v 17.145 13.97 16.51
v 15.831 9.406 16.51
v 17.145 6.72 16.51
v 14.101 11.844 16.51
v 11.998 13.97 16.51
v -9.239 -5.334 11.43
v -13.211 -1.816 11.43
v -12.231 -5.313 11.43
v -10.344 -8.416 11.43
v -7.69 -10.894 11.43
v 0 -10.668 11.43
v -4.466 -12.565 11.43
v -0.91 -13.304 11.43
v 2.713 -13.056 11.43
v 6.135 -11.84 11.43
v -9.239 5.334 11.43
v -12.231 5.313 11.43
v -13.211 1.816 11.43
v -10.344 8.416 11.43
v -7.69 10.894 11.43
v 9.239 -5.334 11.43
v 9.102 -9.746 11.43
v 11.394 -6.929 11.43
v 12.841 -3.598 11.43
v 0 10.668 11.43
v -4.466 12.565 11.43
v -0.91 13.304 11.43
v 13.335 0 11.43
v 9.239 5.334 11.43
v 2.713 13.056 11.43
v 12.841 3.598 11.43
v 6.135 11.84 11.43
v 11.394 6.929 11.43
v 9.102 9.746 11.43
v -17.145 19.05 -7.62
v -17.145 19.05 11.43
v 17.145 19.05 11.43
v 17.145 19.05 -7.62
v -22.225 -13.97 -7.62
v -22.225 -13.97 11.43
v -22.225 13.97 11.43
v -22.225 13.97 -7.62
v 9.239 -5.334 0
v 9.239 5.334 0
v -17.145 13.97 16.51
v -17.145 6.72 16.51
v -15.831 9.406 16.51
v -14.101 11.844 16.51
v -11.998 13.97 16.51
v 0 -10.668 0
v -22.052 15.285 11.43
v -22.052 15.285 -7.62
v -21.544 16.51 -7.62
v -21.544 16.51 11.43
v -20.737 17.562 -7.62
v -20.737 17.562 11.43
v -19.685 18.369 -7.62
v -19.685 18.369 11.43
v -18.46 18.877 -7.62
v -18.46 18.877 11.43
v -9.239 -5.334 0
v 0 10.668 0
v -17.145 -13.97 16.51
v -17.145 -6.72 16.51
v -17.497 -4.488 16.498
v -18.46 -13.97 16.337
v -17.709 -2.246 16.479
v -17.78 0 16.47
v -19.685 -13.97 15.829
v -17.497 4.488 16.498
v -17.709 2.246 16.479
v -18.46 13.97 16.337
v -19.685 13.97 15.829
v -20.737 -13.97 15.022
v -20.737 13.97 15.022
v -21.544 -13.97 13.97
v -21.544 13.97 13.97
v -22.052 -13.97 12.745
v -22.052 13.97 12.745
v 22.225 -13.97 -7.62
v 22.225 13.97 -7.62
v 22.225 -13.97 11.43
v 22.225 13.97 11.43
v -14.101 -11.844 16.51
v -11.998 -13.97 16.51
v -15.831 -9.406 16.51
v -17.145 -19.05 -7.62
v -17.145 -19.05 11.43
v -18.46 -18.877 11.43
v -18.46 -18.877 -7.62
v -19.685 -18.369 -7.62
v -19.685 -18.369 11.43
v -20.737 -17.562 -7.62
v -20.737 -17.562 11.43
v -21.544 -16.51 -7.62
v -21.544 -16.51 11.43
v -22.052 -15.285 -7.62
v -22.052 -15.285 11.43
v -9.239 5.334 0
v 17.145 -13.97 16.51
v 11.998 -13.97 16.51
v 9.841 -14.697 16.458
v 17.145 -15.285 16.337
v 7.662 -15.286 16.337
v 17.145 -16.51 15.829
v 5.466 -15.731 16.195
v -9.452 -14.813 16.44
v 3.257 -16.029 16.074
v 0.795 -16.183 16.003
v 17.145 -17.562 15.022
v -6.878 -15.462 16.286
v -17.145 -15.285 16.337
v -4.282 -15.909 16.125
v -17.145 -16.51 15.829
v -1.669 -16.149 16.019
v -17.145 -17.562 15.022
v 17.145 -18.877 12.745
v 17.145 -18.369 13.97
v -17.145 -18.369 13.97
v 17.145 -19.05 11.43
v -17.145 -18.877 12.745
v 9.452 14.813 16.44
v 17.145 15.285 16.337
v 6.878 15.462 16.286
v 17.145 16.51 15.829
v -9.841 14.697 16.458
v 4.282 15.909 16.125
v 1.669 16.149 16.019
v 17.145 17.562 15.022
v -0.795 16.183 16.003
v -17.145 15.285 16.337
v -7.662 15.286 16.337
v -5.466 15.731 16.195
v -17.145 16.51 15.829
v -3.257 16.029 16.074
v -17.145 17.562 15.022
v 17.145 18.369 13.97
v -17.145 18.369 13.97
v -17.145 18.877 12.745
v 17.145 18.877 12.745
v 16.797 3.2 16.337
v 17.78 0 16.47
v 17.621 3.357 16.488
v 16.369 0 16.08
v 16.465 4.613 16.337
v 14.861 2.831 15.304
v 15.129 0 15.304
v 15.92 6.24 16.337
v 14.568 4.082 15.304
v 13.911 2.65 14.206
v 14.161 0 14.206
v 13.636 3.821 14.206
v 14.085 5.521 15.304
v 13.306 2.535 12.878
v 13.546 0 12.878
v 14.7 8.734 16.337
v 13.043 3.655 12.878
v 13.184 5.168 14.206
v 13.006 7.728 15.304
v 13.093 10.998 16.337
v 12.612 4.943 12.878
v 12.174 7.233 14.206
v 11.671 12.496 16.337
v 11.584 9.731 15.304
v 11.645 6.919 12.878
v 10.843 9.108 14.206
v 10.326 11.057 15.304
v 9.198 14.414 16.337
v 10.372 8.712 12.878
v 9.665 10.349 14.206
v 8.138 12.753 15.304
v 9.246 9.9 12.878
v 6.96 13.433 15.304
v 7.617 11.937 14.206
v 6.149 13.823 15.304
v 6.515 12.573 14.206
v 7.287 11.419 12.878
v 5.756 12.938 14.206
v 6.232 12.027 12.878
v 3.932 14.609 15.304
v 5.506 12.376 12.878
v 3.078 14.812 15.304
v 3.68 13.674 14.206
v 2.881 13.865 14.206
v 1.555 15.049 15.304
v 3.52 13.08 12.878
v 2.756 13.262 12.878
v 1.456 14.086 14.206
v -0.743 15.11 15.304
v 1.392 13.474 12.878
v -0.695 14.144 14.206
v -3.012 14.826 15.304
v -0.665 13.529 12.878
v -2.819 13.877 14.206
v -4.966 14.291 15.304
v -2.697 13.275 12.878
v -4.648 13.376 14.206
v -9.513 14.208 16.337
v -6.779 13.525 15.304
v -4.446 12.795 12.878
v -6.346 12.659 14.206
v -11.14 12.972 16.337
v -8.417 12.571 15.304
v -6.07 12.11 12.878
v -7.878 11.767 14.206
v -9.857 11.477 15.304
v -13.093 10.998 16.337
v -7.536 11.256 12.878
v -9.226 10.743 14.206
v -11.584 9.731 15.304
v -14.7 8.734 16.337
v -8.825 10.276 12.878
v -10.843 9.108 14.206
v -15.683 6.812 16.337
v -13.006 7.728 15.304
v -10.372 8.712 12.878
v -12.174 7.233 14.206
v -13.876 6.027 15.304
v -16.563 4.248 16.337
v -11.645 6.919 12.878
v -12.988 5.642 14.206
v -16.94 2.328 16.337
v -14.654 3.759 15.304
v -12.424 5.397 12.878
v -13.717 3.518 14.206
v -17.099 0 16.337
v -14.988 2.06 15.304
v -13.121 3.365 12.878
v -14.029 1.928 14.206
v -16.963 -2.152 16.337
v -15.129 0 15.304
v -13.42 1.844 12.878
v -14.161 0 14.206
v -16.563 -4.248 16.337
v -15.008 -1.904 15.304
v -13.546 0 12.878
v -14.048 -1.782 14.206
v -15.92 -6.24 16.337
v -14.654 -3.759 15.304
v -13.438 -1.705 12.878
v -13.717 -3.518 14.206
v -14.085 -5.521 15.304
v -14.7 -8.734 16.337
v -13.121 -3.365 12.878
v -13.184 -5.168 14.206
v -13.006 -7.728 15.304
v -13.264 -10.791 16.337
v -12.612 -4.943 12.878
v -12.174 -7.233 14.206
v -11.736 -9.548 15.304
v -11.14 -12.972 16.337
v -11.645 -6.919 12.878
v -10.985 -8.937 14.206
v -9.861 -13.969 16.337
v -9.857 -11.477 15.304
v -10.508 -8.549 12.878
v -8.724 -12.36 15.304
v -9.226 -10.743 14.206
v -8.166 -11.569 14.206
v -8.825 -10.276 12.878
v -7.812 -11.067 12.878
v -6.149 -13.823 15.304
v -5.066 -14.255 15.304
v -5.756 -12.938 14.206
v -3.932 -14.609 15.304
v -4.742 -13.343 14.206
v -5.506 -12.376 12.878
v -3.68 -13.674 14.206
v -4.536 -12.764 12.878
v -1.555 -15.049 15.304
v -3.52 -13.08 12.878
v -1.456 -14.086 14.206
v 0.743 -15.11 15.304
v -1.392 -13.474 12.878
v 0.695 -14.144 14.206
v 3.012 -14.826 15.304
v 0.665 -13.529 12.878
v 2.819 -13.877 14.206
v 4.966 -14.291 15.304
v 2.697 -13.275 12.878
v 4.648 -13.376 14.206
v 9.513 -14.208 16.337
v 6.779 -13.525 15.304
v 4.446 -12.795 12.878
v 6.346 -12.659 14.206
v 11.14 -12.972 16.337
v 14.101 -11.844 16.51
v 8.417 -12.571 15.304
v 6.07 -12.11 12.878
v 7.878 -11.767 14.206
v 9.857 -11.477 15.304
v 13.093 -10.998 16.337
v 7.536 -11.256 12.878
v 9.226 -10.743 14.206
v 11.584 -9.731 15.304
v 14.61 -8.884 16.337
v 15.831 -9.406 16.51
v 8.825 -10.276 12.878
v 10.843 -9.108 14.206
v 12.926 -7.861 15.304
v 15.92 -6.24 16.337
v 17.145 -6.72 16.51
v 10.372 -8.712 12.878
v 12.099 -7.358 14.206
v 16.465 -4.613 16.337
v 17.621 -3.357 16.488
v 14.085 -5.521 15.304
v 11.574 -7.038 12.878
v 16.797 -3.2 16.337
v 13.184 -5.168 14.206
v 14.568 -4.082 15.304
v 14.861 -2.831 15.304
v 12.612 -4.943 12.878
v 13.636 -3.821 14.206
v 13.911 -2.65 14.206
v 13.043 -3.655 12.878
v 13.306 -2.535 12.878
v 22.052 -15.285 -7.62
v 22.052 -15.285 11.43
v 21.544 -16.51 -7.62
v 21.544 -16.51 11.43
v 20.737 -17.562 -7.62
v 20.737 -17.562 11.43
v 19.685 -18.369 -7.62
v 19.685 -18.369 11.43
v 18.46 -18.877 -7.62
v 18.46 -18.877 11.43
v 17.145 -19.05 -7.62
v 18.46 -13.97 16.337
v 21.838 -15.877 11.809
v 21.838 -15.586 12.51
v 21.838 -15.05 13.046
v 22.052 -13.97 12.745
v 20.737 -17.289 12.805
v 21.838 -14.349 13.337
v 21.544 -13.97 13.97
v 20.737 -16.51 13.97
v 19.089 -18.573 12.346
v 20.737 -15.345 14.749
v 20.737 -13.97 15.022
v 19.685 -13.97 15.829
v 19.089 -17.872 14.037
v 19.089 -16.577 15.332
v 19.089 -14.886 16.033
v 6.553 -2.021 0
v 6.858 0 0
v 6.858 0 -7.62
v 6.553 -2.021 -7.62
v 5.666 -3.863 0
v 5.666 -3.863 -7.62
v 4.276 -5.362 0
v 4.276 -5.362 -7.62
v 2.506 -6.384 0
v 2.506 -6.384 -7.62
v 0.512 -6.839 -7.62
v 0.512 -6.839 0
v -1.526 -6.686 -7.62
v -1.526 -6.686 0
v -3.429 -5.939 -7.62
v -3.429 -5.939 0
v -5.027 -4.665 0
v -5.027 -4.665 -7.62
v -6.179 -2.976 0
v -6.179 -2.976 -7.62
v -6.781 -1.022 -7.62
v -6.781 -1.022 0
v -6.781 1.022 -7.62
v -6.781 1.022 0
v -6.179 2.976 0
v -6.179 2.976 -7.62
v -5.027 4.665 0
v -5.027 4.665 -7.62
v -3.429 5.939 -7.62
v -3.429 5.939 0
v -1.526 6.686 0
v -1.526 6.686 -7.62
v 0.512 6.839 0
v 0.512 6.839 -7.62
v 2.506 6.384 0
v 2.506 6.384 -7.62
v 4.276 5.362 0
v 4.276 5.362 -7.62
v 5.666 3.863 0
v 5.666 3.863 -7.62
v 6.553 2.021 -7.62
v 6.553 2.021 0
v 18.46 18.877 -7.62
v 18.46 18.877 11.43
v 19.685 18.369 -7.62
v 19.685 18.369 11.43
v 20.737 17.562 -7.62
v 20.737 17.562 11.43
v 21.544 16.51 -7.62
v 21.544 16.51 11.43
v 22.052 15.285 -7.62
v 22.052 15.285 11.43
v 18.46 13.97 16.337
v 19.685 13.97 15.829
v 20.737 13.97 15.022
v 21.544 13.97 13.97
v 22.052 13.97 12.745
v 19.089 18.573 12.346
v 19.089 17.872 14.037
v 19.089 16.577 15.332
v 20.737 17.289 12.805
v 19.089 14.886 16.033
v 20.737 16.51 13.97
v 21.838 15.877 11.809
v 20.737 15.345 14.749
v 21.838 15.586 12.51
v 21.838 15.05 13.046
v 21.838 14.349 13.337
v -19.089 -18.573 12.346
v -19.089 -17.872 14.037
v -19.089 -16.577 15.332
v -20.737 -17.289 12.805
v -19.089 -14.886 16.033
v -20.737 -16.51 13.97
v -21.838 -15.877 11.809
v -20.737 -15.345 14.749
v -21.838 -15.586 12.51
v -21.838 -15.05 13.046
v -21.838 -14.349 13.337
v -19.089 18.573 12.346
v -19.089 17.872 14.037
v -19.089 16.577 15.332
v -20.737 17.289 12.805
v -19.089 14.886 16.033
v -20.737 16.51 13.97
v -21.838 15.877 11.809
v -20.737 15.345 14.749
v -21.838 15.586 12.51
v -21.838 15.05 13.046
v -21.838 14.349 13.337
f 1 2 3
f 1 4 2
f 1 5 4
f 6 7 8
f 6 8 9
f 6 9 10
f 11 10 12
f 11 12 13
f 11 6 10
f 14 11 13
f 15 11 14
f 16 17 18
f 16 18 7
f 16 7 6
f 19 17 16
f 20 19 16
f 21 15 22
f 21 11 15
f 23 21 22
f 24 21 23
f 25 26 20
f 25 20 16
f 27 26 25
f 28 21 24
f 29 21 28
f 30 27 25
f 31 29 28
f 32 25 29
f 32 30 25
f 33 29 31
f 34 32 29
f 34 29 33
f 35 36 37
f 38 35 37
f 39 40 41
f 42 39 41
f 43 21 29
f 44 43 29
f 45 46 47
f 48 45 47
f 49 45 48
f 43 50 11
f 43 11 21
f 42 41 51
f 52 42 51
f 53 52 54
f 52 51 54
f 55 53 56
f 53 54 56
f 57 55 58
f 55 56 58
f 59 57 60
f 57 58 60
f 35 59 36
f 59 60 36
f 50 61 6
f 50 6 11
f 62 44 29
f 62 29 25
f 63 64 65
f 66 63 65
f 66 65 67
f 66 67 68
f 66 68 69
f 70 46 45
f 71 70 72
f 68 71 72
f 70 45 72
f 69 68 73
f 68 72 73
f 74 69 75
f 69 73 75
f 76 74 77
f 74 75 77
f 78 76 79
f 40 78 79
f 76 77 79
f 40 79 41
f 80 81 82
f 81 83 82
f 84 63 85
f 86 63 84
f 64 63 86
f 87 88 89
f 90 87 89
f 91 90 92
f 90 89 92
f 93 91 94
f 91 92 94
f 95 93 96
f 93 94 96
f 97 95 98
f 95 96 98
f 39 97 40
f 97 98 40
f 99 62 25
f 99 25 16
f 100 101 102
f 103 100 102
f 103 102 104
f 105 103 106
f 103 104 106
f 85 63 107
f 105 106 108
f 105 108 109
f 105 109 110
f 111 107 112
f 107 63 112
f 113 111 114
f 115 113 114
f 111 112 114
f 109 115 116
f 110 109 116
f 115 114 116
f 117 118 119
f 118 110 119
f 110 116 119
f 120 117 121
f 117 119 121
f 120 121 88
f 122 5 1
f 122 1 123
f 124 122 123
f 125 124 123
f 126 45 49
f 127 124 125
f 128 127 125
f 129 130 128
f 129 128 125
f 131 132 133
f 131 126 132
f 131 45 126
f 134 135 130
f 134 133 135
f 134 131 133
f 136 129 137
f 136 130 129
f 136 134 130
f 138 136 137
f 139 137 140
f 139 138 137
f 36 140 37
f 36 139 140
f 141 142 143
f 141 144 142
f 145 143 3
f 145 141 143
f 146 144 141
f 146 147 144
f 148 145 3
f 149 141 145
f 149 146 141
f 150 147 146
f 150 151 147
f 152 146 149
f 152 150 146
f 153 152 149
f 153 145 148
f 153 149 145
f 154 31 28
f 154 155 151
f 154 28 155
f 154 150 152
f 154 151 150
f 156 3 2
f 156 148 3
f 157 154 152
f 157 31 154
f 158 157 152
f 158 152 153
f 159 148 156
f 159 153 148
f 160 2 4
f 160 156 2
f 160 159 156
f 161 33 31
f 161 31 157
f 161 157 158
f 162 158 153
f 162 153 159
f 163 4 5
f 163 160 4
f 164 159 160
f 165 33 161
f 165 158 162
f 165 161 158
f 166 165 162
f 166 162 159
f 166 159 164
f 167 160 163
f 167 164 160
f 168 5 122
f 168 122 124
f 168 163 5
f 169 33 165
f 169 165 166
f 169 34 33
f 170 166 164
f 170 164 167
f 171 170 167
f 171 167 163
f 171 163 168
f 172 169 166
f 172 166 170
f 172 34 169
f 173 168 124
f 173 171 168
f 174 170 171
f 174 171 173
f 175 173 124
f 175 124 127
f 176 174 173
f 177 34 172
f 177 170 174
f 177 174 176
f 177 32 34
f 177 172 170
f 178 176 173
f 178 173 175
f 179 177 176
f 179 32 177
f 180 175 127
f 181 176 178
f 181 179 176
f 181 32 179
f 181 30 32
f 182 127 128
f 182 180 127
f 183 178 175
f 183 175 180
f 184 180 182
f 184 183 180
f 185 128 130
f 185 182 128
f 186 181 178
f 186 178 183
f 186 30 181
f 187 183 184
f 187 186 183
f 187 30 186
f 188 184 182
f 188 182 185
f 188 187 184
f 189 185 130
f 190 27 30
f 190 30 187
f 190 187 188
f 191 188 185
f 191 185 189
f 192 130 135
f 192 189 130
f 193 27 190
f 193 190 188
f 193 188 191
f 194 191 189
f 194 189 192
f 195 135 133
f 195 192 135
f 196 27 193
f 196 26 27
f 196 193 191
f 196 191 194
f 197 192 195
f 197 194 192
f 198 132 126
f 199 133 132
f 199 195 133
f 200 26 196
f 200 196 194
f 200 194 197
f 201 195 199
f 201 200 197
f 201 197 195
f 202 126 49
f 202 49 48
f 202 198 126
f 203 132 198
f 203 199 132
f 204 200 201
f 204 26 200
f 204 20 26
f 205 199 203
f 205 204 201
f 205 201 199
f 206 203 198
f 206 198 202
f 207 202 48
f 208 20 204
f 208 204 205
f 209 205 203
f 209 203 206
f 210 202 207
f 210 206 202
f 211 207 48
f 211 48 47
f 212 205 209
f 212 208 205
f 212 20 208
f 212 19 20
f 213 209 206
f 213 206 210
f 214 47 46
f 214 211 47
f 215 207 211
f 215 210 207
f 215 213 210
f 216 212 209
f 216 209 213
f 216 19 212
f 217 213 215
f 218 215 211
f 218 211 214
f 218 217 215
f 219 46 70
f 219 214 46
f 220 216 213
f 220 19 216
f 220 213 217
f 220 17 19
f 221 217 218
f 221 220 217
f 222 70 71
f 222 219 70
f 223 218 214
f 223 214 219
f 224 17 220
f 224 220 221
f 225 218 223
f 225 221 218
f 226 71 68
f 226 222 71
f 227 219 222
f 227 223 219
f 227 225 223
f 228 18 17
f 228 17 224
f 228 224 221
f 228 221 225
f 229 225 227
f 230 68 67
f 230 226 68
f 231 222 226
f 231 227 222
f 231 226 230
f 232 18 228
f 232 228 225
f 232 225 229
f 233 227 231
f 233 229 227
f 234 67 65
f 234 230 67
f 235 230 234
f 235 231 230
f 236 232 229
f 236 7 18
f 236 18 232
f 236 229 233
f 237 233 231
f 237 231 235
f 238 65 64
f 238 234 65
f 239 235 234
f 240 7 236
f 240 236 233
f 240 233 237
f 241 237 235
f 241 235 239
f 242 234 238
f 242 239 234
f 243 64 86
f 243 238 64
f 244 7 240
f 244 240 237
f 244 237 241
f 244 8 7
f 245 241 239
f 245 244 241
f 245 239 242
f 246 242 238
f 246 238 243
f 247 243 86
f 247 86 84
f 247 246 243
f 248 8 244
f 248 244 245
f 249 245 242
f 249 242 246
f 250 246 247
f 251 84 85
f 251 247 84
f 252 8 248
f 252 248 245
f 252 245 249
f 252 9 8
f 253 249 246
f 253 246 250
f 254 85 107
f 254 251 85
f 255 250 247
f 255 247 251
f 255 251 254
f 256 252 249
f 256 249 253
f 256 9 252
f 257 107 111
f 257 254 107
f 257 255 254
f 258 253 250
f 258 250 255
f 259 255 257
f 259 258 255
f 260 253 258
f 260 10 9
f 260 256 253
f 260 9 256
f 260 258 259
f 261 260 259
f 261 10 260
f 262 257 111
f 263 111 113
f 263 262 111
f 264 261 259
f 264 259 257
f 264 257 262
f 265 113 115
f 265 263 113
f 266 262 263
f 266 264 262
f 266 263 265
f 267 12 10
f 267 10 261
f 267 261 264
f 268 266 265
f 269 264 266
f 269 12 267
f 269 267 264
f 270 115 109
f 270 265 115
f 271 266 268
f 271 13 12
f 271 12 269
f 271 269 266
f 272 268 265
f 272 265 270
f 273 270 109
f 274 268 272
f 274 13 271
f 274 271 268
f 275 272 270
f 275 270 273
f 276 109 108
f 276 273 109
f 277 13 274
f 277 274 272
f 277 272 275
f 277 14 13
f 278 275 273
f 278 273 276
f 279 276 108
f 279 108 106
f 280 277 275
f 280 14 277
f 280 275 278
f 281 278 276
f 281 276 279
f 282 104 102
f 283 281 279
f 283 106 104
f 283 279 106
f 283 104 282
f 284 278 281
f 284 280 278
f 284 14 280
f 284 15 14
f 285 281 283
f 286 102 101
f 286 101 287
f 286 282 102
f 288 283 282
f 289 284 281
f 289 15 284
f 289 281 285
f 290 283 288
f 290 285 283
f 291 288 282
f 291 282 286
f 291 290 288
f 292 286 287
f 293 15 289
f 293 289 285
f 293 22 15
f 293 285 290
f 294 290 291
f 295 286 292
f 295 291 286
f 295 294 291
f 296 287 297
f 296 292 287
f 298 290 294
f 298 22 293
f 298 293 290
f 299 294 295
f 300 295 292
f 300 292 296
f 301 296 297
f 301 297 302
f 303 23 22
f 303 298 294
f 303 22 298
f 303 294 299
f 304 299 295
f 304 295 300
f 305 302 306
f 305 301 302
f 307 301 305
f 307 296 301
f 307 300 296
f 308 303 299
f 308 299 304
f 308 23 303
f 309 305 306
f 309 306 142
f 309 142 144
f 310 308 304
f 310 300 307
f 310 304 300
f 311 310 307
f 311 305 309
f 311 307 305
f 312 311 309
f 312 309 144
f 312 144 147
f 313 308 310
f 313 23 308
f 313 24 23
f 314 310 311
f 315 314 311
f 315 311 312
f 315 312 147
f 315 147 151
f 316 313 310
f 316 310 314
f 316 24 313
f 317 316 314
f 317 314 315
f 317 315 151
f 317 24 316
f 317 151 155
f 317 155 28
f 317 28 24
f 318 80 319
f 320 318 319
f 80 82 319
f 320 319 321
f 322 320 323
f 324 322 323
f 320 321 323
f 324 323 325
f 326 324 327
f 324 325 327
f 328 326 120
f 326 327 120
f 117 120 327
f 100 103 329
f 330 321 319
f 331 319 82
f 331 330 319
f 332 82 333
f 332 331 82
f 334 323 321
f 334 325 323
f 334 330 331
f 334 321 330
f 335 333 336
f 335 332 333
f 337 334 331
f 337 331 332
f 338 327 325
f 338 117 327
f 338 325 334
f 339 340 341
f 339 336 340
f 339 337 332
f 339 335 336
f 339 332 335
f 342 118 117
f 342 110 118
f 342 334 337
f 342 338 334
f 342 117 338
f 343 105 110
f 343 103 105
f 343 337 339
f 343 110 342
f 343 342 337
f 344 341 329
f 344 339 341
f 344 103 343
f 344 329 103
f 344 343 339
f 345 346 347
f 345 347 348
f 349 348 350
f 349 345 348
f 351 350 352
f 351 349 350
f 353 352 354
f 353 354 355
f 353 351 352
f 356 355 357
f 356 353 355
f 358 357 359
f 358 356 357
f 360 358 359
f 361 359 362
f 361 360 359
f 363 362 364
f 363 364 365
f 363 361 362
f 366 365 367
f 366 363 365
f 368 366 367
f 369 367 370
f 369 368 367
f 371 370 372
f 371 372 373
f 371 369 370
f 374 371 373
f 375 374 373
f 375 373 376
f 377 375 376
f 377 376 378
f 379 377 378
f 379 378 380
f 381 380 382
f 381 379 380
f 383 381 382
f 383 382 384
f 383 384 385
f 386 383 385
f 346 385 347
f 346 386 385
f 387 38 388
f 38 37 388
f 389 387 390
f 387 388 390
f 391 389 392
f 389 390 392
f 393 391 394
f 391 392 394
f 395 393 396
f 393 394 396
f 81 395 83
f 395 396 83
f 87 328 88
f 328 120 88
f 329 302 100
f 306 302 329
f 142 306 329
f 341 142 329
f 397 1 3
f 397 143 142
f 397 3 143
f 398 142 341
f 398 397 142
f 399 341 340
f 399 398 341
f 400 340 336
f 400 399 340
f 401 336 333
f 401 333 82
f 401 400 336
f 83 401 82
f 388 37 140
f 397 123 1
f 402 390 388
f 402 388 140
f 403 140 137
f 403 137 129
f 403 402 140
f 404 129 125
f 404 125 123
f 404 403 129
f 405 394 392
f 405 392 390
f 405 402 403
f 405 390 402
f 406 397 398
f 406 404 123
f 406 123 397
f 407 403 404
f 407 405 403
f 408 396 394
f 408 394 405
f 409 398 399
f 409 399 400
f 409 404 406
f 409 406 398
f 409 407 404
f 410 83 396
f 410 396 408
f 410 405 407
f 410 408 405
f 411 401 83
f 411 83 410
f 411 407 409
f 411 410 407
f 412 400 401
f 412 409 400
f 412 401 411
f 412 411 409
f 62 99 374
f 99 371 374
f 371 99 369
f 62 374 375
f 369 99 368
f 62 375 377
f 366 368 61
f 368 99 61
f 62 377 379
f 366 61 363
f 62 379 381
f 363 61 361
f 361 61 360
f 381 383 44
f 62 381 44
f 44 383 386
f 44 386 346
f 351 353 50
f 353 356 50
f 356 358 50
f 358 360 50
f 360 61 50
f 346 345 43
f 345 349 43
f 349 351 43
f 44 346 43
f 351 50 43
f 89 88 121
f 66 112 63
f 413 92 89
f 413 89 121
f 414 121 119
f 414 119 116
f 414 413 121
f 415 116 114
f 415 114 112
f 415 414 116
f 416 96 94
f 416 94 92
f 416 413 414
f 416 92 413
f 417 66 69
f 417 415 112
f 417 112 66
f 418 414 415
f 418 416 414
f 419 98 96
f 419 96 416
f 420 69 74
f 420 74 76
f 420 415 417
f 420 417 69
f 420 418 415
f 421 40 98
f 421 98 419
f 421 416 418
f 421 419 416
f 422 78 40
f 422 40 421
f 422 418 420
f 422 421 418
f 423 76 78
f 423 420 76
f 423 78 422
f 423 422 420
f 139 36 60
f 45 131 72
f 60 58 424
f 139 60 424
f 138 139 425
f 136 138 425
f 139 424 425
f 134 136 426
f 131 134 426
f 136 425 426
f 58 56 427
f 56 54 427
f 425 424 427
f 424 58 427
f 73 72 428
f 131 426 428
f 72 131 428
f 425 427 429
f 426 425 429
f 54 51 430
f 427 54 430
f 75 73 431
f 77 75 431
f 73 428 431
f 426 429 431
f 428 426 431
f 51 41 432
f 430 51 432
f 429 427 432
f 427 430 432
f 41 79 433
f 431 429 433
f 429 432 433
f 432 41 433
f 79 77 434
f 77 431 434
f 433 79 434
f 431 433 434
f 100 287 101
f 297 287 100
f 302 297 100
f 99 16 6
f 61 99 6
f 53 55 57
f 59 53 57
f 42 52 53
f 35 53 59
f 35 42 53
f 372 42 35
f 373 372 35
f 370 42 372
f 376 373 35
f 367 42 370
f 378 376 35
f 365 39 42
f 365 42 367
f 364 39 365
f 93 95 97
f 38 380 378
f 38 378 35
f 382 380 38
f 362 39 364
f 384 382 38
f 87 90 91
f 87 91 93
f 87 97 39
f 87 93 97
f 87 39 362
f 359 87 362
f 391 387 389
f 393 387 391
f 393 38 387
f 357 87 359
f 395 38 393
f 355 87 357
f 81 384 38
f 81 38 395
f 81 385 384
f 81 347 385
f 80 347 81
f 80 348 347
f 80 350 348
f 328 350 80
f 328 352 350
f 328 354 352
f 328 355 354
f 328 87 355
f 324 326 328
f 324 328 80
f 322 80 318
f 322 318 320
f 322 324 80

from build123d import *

# Parameters (mm, degrees)
F0_W         = 44.45
F0_H         = 38.1
F1_DEPTH     = 16.51
F3_DEPTH     = 25.4
F4_R         = 13.335
F5_DEPTH     = 5.08
F6_F1_R      = 5.0799
F6_T2_DEPTH  = 69.85
F6_T4_DEPTH  = 69.85
F6_T6_DEPTH  = 27.94
F6_T8_DEPTH  = 24.13
F6_T11_ANGLE = 90
F6_T13_ANGLE = 90
F6_T14_DEPTH = 27.94
F6_T16_DEPTH = 24.13
F6_T19_ANGLE = 90
F6_T21_ANGLE = 90
F8_R         = 6.858
F9_DEPTH     = 7.62


# Not quite as in the source:
# - a fillet or chamfer that OpenCascade refuses, or shapes differently, is made with other operations: its cross-section is extruded or revolved along the edge and cut away or added
# - a fillet or chamfer is up to 0.001 mm smaller than in the source, because OpenCascade refuses the exact size
# - a feature of the source that left no trace in its solid (it failed there, or was rolled back) is left out


with BuildPart() as f1:
    # F0 (on Top) → F1 (new body)
    with BuildSketch(Plane.XY):
        Rectangle(F0_W, F0_H)
    extrude(amount=F1_DEPTH)

    # F2 (on face) → F3 (cut)
    with BuildSketch(Plane.XY.offset(16.51)):
        Polygon((9.2387590076, 5.334), (0, 10.668), (-9.2387590076, 5.334), (-9.2387590076, -5.334), (0, -10.668), (9.2387590076, -5.334), align=None)
    extrude(amount=-F3_DEPTH, mode=Mode.SUBTRACT)

    # F4 (on face) → F5 (cut)
    with BuildSketch(Plane.XY.offset(16.51)):
        Circle(F4_R)
        Polygon((-9.2387590076, 5.334), (0, 10.668), (9.2387590076, 5.334), (9.2387590076, -5.334), (0, -10.668), (-9.2387590076, -5.334), align=None, mode=Mode.SUBTRACT)
    extrude(amount=-F5_DEPTH, mode=Mode.SUBTRACT)

    # F6: fillet of radius 5.08 on 5 edges, made by hand

    # F6_f1 (radius 5.08 in the source; OpenCascade refuses exactly that, so slightly less here)
    f6_f1_edges = [f1.edges().sort_by_distance(p)[0] for p in [
        (-13.335, 0, 16.51),
    ]]
    fillet(f6_f1_edges, radius=F6_F1_R)

    # F6_s3 → F6_t2 (cut)
    with BuildSketch(Plane.YZ.offset(-34.925)):
        with BuildLine():
            ThreePointArc((13.97, 16.51), (17.5621024484, 15.0221024484), (19.05, 11.43))
            Line((19.05, 11.43), (19.1516, 11.43))
            Line((19.1516, 11.43), (19.1516, 16.6116))
            Line((19.1516, 16.6116), (13.97, 16.6116))
            Line((13.97, 16.6116), (13.97, 16.51))
        make_face()
    extrude(amount=F6_T2_DEPTH, mode=Mode.SUBTRACT)

    # F6_s5 → F6_t4 (cut)
    with BuildSketch(Plane.YZ.offset(-34.925)):
        with BuildLine():
            ThreePointArc((-13.97, 16.51), (-17.5621024484, 15.0221024484), (-19.05, 11.43))
            Line((-19.05, 11.43), (-19.1516, 11.43))
            Line((-19.1516, 11.43), (-19.1516, 16.6116))
            Line((-19.1516, 16.6116), (-13.97, 16.6116))
            Line((-13.97, 16.6116), (-13.97, 16.51))
        make_face()
    extrude(amount=F6_T4_DEPTH, mode=Mode.SUBTRACT)

    # F6_s7 → F6_t6 (cut)
    with BuildSketch(Plane.XZ.offset(-13.97)):
        with BuildLine():
            ThreePointArc((17.145, 16.51), (20.7371024484, 15.0221024484), (22.225, 11.43))
            Line((22.225, 11.43), (22.3266, 11.43))
            Line((22.3266, 11.43), (22.3266, 16.6116))
            Line((22.3266, 16.6116), (17.145, 16.6116))
            Line((17.145, 16.6116), (17.145, 16.51))
        make_face()
    extrude(amount=F6_T6_DEPTH, mode=Mode.SUBTRACT)

    # F6_s9 → F6_t8 (cut)
    with BuildSketch(Plane.XY.offset(-12.7)):
        with BuildLine():
            ThreePointArc((22.225, 13.97), (20.7371024484, 17.5621024484), (17.145, 19.05))
            Line((17.145, 19.05), (17.145, 19.1516))
            Line((17.145, 19.1516), (22.3266, 19.1516))
            Line((22.3266, 19.1516), (22.3266, 13.97))
            Line((22.3266, 13.97), (22.225, 13.97))
        make_face()
        with BuildLine():
            ThreePointArc((22.225, -13.97), (20.7371024484, -17.5621024484), (17.145, -19.05))
            Line((17.145, -19.05), (17.145, -19.1516))
            Line((17.145, -19.1516), (22.3266, -19.1516))
            Line((22.3266, -19.1516), (22.3266, -13.97))
            Line((22.3266, -13.97), (22.225, -13.97))
        make_face()
    extrude(amount=F6_T8_DEPTH, mode=Mode.SUBTRACT)

    # F6_s10 → F6_t11 (revolve, cut)
    with BuildSketch(Plane.XY.offset(11.43)):
        with BuildLine():
            ThreePointArc((22.225, -13.97), (20.7371024484, -17.5621024484), (17.145, -19.05))
            Line((17.145, -19.05), (17.145, -19.1516))
            Line((17.145, -19.1516), (22.3266, -19.1516))
            Line((22.3266, -19.1516), (22.3266, -13.97))
            Line((22.3266, -13.97), (22.225, -13.97))
        make_face()
    revolve(axis=Axis((22.225, -13.97, 11.43), (-1, 0, 0)), revolution_arc=F6_T11_ANGLE, mode=Mode.SUBTRACT)

    # F6_s12 → F6_t13 (revolve, cut)
    with BuildSketch(Plane.XY.offset(11.43)):
        with BuildLine():
            ThreePointArc((17.145, 19.05), (20.7371024484, 17.5621024484), (22.225, 13.97))
            Line((22.225, 13.97), (22.3266, 13.97))
            Line((22.3266, 13.97), (22.3266, 19.1516))
            Line((22.3266, 19.1516), (17.145, 19.1516))
            Line((17.145, 19.1516), (17.145, 19.05))
        make_face()
    revolve(axis=Axis((22.225, 13.97, 11.43), (1, 0, 0)), revolution_arc=F6_T13_ANGLE, mode=Mode.SUBTRACT)

    # F6_s15 → F6_t14 (cut)
    with BuildSketch(Plane.XZ.offset(-13.97)):
        with BuildLine():
            ThreePointArc((-17.145, 16.51), (-20.7371024484, 15.0221024484), (-22.225, 11.43))
            Line((-22.225, 11.43), (-22.3266, 11.43))
            Line((-22.3266, 11.43), (-22.3266, 16.6116))
            Line((-22.3266, 16.6116), (-17.145, 16.6116))
            Line((-17.145, 16.6116), (-17.145, 16.51))
        make_face()
    extrude(amount=F6_T14_DEPTH, mode=Mode.SUBTRACT)

    # F6_s17 → F6_t16 (cut)
    with BuildSketch(Plane.XY.offset(-12.7)):
        with BuildLine():
            ThreePointArc((-22.225, -13.97), (-20.7371024484, -17.5621024484), (-17.145, -19.05))
            Line((-17.145, -19.05), (-17.145, -19.1516))
            Line((-17.145, -19.1516), (-22.3266, -19.1516))
            Line((-22.3266, -19.1516), (-22.3266, -13.97))
            Line((-22.3266, -13.97), (-22.225, -13.97))
        make_face()
        with BuildLine():
            ThreePointArc((-17.145, 19.05), (-20.7371024484, 17.5621024484), (-22.225, 13.97))
            Line((-22.225, 13.97), (-22.3266, 13.97))
            Line((-22.3266, 13.97), (-22.3266, 19.1516))
            Line((-22.3266, 19.1516), (-17.145, 19.1516))
            Line((-17.145, 19.1516), (-17.145, 19.05))
        make_face()
    extrude(amount=F6_T16_DEPTH, mode=Mode.SUBTRACT)

    # F6_s18 → F6_t19 (revolve, cut)
    with BuildSketch(Plane.XY.offset(11.43)):
        with BuildLine():
            ThreePointArc((-17.145, 19.05), (-20.7371024484, 17.5621024484), (-22.225, 13.97))
            Line((-22.225, 13.97), (-22.3266, 13.97))
            Line((-22.3266, 13.97), (-22.3266, 19.1516))
            Line((-22.3266, 19.1516), (-17.145, 19.1516))
            Line((-17.145, 19.1516), (-17.145, 19.05))
        make_face()
    revolve(axis=Axis((-22.225, 13.97, 11.43), (1, 0, 0)), revolution_arc=F6_T19_ANGLE, mode=Mode.SUBTRACT)

    # F6_s20 → F6_t21 (revolve, cut)
    with BuildSketch(Plane.XY.offset(11.43)):
        with BuildLine():
            ThreePointArc((-17.145, -19.05), (-20.7371024484, -17.5621024484), (-22.225, -13.97))
            Line((-22.225, -13.97), (-22.3266, -13.97))
            Line((-22.3266, -13.97), (-22.3266, -19.1516))
            Line((-22.3266, -19.1516), (-17.145, -19.1516))
            Line((-17.145, -19.1516), (-17.145, -19.05))
        make_face()
    revolve(axis=Axis((-22.225, -13.97, 11.43), (-1, 0, 0)), revolution_arc=F6_T21_ANGLE, mode=Mode.SUBTRACT)

    # F8 (on face) → F9 (join)
    with BuildSketch(Plane(origin=(0, 0, 0), x_dir=(1, 0, 0), z_dir=(0, 0, -1))):
        with BuildLine():
            Line((-17.145, -19.05), (17.145, -19.05))
            ThreePointArc((17.145, -19.05), (20.7371024484, -17.5621024484), (22.225, -13.97))
            Line((22.225, -13.97), (22.225, 13.97))
            ThreePointArc((22.225, 13.97), (20.7371024484, 17.5621024484), (17.145, 19.05))
            Line((17.145, 19.05), (-17.145, 19.05))
            ThreePointArc((-17.145, 19.05), (-20.7371024484, 17.5621024484), (-22.225, 13.97))
            Line((-22.225, 13.97), (-22.225, -13.97))
            ThreePointArc((-22.225, -13.97), (-20.7371024484, -17.5621024484), (-17.145, -19.05))
        make_face()
        Polygon((9.2387590076, 5.334), (9.2387590076, -5.334), (0, -10.668), (-9.2387590076, -5.334), (-9.2387590076, 5.334), (0, 10.668), align=None, mode=Mode.SUBTRACT)
        Polygon((0, -10.668), (9.2387590076, -5.334), (9.2387590076, 5.334), (0, 10.668), (-9.2387590076, 5.334), (-9.2387590076, -5.334), align=None)
        Circle(F8_R, mode=Mode.SUBTRACT)
    extrude(amount=F9_DEPTH)


solid = f1.part
